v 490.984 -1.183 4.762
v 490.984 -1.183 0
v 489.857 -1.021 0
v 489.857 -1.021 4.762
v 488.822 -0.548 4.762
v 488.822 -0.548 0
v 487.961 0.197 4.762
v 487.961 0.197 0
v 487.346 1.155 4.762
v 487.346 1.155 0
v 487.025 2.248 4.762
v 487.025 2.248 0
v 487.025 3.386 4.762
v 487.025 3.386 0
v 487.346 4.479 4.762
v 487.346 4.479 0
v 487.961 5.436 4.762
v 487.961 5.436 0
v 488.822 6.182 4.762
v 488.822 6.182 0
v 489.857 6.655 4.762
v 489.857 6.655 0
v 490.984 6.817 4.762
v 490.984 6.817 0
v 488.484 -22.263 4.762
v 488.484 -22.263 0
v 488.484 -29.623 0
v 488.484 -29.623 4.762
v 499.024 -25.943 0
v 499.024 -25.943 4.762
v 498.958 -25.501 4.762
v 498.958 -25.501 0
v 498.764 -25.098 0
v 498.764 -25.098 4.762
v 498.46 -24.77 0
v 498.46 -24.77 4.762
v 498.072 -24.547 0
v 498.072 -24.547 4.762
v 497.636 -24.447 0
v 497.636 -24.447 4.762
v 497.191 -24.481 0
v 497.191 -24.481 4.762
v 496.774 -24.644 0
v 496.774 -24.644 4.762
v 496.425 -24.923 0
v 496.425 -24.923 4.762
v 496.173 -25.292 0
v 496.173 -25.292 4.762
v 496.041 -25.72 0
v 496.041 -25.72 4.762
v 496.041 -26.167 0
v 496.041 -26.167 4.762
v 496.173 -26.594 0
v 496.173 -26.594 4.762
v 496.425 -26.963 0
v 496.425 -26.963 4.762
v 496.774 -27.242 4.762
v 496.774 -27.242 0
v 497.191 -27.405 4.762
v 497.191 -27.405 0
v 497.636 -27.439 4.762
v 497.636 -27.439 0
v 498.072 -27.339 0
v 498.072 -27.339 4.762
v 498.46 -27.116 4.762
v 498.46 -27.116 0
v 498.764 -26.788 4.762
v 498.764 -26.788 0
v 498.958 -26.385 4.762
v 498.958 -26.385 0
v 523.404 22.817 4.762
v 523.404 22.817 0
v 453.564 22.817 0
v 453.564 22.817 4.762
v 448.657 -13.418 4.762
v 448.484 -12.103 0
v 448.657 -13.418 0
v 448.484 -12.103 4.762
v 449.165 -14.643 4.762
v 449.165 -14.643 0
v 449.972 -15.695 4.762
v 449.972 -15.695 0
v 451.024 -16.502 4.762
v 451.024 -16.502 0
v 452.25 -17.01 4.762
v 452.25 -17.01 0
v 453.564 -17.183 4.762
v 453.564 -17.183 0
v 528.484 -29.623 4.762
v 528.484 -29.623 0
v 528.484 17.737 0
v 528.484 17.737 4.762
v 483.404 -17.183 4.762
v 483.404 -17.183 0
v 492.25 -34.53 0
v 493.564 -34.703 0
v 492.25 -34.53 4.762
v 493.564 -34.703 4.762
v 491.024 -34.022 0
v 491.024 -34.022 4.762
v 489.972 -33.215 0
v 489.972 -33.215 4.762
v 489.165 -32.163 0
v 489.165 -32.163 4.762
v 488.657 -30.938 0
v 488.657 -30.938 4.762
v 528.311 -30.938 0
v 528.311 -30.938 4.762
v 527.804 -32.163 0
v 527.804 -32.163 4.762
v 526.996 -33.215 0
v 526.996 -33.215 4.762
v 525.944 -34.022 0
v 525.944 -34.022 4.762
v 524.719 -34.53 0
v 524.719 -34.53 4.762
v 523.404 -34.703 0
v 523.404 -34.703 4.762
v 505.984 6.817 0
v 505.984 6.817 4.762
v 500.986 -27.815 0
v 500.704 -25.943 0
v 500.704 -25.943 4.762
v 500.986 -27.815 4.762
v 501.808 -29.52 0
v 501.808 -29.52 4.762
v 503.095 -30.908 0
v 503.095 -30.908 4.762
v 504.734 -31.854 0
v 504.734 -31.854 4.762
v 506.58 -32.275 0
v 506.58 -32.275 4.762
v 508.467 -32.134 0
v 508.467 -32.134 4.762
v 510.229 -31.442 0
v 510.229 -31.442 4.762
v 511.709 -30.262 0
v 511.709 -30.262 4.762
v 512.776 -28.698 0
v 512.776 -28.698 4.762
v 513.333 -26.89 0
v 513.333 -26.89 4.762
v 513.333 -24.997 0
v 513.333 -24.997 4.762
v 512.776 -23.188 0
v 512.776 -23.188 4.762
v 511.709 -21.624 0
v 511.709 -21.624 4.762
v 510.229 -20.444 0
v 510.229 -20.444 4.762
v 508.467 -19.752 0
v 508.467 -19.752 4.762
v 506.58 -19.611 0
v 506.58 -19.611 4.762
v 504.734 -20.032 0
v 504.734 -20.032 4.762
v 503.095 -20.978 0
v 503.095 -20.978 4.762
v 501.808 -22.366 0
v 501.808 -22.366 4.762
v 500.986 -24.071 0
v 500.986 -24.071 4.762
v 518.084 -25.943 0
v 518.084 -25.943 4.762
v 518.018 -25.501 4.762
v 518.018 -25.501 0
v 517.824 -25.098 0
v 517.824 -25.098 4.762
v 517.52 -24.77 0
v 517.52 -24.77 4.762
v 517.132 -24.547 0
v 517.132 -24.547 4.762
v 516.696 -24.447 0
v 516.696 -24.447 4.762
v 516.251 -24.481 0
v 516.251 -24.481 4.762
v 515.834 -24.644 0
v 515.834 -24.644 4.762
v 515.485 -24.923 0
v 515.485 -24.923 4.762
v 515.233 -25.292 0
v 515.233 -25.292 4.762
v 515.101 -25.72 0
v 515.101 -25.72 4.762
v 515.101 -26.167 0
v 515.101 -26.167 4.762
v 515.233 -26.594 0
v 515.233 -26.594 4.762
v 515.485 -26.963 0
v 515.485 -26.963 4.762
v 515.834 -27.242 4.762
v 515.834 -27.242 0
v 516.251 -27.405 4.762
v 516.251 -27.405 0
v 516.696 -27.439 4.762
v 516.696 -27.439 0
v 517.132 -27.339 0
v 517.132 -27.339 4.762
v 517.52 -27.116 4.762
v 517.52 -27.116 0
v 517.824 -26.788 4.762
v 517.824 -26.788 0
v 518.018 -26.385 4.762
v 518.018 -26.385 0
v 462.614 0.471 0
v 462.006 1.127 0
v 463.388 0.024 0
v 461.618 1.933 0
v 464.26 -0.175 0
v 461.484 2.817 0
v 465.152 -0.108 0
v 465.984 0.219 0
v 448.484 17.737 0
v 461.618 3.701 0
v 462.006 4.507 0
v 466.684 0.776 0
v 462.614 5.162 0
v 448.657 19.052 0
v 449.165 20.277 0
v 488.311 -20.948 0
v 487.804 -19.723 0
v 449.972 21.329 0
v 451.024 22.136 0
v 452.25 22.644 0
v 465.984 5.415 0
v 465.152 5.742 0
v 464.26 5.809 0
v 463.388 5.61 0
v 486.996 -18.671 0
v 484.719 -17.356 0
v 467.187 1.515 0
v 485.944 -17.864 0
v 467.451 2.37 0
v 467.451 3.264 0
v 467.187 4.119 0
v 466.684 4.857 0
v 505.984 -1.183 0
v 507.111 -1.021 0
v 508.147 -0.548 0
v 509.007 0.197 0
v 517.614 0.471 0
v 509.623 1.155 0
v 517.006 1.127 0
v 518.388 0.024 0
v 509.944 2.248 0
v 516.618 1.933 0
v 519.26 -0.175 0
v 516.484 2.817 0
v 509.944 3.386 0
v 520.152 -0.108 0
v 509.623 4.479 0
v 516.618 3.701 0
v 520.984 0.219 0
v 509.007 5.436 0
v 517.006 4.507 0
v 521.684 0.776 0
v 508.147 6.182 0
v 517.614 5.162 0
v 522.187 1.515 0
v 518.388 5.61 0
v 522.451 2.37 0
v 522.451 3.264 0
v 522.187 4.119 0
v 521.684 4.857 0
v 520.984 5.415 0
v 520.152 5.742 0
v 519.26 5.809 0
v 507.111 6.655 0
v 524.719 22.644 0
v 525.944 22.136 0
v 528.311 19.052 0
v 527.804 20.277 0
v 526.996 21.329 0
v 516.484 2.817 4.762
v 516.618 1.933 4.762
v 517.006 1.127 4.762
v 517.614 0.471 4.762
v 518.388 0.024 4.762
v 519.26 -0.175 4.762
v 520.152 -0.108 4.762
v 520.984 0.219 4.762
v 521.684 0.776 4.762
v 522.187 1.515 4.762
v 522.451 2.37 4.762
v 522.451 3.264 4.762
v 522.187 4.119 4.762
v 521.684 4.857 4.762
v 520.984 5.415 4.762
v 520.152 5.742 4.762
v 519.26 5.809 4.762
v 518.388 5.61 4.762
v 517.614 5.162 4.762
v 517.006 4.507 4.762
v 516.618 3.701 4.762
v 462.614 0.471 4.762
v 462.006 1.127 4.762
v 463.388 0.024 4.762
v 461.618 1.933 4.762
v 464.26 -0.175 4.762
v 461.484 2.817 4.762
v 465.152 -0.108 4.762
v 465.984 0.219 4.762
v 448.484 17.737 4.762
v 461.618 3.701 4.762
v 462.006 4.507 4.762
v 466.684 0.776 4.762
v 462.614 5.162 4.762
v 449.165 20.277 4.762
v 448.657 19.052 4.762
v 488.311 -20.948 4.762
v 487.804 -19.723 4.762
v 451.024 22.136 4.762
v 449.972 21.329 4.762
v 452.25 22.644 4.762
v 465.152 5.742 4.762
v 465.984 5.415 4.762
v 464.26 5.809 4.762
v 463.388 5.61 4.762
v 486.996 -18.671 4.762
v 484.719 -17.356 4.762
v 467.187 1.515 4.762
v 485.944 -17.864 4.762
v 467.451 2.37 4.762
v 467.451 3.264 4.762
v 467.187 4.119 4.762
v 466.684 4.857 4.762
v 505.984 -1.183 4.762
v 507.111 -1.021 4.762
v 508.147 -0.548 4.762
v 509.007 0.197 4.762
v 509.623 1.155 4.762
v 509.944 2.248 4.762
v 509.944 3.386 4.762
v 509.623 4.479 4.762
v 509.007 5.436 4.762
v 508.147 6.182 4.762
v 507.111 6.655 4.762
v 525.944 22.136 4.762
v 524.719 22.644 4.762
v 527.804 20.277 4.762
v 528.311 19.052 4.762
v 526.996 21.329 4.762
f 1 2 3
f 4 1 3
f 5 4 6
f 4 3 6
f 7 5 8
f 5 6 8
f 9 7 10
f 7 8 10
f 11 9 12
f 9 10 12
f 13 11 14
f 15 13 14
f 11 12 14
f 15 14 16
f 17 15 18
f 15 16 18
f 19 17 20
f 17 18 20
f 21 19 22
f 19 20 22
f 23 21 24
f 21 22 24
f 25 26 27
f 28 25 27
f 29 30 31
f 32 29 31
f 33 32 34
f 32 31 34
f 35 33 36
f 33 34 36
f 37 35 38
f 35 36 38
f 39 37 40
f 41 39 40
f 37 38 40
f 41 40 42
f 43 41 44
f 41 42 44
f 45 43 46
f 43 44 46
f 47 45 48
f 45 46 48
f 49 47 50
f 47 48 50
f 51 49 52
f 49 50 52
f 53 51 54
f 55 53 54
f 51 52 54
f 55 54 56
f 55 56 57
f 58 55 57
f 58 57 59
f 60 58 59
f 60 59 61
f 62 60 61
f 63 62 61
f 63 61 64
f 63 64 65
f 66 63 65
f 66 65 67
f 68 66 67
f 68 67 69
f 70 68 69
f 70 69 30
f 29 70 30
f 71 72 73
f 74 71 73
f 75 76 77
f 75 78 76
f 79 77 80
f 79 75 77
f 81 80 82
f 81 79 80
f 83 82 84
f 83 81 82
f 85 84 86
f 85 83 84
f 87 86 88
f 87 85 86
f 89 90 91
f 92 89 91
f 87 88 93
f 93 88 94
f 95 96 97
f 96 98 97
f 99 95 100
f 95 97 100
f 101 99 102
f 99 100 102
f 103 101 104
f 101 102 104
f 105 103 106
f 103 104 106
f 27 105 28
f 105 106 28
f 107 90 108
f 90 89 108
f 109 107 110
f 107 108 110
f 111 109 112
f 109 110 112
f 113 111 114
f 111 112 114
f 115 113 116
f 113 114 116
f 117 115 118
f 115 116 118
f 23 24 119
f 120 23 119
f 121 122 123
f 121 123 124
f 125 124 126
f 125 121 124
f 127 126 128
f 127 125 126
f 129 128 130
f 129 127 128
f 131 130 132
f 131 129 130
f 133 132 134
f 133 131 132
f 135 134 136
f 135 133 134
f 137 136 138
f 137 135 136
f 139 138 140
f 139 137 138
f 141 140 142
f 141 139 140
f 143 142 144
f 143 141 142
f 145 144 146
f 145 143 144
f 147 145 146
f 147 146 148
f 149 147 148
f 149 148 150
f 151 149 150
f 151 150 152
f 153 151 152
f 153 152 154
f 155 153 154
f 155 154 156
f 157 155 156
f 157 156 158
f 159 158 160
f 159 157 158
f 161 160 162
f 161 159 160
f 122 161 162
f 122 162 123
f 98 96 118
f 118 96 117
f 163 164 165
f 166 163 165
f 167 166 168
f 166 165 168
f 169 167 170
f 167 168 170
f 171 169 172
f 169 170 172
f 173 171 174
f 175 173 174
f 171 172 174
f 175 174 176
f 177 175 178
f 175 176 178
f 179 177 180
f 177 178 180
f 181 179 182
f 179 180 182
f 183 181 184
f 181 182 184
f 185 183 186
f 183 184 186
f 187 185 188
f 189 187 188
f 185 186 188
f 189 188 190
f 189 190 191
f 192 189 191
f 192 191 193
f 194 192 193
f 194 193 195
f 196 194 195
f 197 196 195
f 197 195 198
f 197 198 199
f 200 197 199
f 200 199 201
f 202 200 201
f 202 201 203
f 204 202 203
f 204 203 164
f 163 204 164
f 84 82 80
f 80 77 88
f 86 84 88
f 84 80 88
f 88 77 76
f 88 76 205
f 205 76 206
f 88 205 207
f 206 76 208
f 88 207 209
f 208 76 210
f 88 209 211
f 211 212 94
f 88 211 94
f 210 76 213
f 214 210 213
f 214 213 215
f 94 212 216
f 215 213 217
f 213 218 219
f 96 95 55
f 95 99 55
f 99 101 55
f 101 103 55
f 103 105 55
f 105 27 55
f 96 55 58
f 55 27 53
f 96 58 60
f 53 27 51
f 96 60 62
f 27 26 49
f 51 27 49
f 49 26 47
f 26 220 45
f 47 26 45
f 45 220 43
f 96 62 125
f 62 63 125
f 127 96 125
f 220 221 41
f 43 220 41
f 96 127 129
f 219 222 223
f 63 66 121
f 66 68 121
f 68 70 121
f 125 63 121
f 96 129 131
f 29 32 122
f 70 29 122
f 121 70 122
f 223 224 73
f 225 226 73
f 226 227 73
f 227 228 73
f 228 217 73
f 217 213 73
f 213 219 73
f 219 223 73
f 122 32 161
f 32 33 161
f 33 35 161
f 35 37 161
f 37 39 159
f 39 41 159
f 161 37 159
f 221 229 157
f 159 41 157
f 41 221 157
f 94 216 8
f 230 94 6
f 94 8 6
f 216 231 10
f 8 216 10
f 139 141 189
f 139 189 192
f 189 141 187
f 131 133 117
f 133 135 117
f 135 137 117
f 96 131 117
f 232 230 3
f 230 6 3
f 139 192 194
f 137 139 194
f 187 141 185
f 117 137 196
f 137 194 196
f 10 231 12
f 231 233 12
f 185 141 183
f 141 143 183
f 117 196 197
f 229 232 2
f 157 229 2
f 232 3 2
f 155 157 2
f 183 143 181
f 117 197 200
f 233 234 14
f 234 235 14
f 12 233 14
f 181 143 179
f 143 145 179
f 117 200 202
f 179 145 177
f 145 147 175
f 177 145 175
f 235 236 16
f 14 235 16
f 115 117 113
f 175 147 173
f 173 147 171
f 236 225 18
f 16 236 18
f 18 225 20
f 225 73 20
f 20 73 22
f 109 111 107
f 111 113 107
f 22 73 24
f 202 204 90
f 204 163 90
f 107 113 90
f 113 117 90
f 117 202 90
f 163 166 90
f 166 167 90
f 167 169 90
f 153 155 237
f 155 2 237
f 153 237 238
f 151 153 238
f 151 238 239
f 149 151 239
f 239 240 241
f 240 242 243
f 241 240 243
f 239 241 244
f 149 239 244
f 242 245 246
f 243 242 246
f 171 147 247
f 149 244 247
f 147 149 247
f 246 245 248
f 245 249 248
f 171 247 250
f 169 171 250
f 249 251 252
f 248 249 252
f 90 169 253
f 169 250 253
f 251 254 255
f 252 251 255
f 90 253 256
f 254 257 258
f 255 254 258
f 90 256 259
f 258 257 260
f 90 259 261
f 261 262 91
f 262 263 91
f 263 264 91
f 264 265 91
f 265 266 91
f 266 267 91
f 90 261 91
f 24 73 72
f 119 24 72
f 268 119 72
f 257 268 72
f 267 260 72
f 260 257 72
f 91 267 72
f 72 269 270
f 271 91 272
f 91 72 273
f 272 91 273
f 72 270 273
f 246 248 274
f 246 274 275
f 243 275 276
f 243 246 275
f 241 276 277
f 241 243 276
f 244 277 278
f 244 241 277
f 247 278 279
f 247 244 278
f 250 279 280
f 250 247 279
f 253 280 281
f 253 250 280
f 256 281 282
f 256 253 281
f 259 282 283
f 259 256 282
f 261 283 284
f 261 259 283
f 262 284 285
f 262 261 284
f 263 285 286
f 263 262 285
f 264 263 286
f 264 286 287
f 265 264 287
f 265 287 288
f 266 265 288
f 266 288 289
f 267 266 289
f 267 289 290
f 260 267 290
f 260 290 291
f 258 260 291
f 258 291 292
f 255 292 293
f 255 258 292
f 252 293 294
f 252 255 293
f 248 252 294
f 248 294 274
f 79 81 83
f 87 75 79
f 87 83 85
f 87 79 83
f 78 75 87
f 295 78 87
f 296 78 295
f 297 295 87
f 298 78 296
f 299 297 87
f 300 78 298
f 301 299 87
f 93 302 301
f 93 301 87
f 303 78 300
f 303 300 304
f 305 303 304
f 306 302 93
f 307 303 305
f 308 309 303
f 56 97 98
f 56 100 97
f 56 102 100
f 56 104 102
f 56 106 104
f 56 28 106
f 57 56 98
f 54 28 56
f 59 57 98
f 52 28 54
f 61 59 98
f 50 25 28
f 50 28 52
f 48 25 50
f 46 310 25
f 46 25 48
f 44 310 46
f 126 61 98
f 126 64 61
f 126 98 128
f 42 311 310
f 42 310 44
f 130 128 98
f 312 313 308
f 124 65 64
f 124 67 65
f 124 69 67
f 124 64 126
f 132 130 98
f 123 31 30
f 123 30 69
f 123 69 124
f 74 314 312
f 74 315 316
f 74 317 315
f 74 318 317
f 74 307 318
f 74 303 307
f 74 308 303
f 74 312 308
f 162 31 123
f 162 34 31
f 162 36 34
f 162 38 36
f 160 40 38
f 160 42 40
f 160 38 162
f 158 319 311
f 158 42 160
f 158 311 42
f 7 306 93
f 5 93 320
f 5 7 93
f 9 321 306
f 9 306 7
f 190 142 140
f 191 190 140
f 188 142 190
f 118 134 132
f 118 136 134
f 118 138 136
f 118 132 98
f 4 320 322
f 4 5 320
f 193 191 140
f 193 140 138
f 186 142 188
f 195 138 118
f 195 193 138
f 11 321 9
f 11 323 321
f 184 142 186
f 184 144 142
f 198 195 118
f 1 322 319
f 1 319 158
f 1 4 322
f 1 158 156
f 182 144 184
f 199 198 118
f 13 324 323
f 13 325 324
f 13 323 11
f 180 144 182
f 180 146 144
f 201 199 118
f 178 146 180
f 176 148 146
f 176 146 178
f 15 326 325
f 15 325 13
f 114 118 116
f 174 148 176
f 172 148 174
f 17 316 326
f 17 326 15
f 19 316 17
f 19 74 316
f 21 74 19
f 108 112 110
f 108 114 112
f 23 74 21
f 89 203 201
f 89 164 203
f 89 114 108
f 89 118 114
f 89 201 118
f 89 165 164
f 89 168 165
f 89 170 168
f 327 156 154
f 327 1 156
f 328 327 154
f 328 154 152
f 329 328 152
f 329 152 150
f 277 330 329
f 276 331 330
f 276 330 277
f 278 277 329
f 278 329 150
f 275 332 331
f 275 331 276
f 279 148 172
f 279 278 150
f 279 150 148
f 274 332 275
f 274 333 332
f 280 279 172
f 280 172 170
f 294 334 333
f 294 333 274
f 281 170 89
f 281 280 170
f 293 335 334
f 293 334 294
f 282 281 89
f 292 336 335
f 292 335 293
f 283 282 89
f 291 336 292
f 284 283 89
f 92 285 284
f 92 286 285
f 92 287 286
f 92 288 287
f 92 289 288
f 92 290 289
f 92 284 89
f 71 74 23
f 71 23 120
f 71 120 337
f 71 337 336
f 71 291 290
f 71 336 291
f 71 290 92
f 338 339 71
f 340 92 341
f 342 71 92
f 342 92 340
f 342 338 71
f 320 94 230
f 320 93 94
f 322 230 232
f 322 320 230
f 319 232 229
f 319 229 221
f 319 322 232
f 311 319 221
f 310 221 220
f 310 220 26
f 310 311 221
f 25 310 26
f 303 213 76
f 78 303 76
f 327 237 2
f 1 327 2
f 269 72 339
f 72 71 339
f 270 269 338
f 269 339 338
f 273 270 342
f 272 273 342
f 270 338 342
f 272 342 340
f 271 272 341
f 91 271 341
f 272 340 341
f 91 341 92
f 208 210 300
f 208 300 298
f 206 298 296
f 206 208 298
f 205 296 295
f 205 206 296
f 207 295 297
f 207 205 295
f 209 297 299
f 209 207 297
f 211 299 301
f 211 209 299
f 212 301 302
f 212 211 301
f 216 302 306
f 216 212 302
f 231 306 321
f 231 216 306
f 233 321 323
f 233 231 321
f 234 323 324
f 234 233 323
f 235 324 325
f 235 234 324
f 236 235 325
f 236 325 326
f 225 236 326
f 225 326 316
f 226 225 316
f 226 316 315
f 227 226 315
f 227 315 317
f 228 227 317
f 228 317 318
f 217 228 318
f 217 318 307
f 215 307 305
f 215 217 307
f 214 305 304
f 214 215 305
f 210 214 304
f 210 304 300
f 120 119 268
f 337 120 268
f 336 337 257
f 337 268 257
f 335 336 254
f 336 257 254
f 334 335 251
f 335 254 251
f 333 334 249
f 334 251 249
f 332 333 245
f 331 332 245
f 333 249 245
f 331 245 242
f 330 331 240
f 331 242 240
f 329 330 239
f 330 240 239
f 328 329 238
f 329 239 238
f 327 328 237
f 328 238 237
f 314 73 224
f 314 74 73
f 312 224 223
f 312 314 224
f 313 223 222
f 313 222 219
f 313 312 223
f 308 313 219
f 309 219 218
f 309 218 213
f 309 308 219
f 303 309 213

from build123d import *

# Parameters (mm, degrees)
SKETCH1_R                    = 6.349999999
SKETCH1_R_2                  = 3
BOSS_EXTRUDE1_DEPTH          = 4.7625
FILLET1_R                    = 5.08
F_3_0_3_DIAMETER_HOLE1_D     = 3
F_3_0_3_DIAMETER_HOLE1_DEPTH = 25.4
F_3_0_3_DIAMETER_HOLE1_TIP   = 0.901290929


with BuildPart() as part:
    # Sketch1 → Boss-Extrude1 (new body)
    with BuildSketch(Plane.XY):
        Polygon((528.484361343, 22.816913392), (448.484361343, 22.816913392), (448.484361343, -17.183086608), (488.484361343, -17.183086608), (488.484361343, -34.703086608), (528.484361343, -34.703086608), align=None)
        with Locations(Location((507.054361343, -25.943086608, 0), (0, 0, 180))):
            Circle(SKETCH1_R, mode=Mode.SUBTRACT)
        with Locations(Location((464.484361343, 2.816913392, 0), (0, 0, 180))):
            Circle(SKETCH1_R_2, mode=Mode.SUBTRACT)
        with Locations(Location((519.484361343, 2.816913392, 0), (0, 0, 180))):
            Circle(SKETCH1_R_2, mode=Mode.SUBTRACT)
        with BuildLine():
            Line((490.984361343, 6.816913392), (505.984361343, 6.816913392))
            ThreePointArc((505.984361343, 6.816913392), (509.984361343, 2.816913392), (505.984361343, -1.183086608))
            Line((505.984361343, -1.183086608), (490.984361343, -1.183086608))
            ThreePointArc((490.984361343, -1.183086608), (486.984361343, 2.816913392), (490.984361343, 6.816913392))
        make_face(mode=Mode.SUBTRACT)
    extrude(amount=BOSS_EXTRUDE1_DEPTH)

    # Fillet1
    fillet1_edges = [part.edges().sort_by_distance(p)[0] for p in [
        (528.484361343, -34.703086608, 2.38125),
        (488.484361343, -34.703086608, 2.38125),
        (488.484361343, -17.183086608, 2.38125),
        (448.484361343, -17.183086608, 2.38125),
        (448.484361343, 22.816913392, 2.38125),
        (528.484361343, 22.816913392, 2.38125),
    ]]
    fillet(fillet1_edges, radius=FILLET1_R)

    # Ø3.0 (3) Diameter Hole1
    with Locations(Plane(origin=(0, 0, 0), x_dir=(-1, 0, 0), z_dir=(0, 0, -1))):
        with Locations((-497.524361343, -25.943086608), (-516.584361343, -25.943086608)):
            Hole(F_3_0_3_DIAMETER_HOLE1_D / 2, depth=F_3_0_3_DIAMETER_HOLE1_DEPTH)
            with Locations((0, 0, -(F_3_0_3_DIAMETER_HOLE1_DEPTH + F_3_0_3_DIAMETER_HOLE1_TIP / 2))):  # 118° drill point
                Cone(0, F_3_0_3_DIAMETER_HOLE1_D / 2, F_3_0_3_DIAMETER_HOLE1_TIP, mode=Mode.SUBTRACT)


solid = part.part
